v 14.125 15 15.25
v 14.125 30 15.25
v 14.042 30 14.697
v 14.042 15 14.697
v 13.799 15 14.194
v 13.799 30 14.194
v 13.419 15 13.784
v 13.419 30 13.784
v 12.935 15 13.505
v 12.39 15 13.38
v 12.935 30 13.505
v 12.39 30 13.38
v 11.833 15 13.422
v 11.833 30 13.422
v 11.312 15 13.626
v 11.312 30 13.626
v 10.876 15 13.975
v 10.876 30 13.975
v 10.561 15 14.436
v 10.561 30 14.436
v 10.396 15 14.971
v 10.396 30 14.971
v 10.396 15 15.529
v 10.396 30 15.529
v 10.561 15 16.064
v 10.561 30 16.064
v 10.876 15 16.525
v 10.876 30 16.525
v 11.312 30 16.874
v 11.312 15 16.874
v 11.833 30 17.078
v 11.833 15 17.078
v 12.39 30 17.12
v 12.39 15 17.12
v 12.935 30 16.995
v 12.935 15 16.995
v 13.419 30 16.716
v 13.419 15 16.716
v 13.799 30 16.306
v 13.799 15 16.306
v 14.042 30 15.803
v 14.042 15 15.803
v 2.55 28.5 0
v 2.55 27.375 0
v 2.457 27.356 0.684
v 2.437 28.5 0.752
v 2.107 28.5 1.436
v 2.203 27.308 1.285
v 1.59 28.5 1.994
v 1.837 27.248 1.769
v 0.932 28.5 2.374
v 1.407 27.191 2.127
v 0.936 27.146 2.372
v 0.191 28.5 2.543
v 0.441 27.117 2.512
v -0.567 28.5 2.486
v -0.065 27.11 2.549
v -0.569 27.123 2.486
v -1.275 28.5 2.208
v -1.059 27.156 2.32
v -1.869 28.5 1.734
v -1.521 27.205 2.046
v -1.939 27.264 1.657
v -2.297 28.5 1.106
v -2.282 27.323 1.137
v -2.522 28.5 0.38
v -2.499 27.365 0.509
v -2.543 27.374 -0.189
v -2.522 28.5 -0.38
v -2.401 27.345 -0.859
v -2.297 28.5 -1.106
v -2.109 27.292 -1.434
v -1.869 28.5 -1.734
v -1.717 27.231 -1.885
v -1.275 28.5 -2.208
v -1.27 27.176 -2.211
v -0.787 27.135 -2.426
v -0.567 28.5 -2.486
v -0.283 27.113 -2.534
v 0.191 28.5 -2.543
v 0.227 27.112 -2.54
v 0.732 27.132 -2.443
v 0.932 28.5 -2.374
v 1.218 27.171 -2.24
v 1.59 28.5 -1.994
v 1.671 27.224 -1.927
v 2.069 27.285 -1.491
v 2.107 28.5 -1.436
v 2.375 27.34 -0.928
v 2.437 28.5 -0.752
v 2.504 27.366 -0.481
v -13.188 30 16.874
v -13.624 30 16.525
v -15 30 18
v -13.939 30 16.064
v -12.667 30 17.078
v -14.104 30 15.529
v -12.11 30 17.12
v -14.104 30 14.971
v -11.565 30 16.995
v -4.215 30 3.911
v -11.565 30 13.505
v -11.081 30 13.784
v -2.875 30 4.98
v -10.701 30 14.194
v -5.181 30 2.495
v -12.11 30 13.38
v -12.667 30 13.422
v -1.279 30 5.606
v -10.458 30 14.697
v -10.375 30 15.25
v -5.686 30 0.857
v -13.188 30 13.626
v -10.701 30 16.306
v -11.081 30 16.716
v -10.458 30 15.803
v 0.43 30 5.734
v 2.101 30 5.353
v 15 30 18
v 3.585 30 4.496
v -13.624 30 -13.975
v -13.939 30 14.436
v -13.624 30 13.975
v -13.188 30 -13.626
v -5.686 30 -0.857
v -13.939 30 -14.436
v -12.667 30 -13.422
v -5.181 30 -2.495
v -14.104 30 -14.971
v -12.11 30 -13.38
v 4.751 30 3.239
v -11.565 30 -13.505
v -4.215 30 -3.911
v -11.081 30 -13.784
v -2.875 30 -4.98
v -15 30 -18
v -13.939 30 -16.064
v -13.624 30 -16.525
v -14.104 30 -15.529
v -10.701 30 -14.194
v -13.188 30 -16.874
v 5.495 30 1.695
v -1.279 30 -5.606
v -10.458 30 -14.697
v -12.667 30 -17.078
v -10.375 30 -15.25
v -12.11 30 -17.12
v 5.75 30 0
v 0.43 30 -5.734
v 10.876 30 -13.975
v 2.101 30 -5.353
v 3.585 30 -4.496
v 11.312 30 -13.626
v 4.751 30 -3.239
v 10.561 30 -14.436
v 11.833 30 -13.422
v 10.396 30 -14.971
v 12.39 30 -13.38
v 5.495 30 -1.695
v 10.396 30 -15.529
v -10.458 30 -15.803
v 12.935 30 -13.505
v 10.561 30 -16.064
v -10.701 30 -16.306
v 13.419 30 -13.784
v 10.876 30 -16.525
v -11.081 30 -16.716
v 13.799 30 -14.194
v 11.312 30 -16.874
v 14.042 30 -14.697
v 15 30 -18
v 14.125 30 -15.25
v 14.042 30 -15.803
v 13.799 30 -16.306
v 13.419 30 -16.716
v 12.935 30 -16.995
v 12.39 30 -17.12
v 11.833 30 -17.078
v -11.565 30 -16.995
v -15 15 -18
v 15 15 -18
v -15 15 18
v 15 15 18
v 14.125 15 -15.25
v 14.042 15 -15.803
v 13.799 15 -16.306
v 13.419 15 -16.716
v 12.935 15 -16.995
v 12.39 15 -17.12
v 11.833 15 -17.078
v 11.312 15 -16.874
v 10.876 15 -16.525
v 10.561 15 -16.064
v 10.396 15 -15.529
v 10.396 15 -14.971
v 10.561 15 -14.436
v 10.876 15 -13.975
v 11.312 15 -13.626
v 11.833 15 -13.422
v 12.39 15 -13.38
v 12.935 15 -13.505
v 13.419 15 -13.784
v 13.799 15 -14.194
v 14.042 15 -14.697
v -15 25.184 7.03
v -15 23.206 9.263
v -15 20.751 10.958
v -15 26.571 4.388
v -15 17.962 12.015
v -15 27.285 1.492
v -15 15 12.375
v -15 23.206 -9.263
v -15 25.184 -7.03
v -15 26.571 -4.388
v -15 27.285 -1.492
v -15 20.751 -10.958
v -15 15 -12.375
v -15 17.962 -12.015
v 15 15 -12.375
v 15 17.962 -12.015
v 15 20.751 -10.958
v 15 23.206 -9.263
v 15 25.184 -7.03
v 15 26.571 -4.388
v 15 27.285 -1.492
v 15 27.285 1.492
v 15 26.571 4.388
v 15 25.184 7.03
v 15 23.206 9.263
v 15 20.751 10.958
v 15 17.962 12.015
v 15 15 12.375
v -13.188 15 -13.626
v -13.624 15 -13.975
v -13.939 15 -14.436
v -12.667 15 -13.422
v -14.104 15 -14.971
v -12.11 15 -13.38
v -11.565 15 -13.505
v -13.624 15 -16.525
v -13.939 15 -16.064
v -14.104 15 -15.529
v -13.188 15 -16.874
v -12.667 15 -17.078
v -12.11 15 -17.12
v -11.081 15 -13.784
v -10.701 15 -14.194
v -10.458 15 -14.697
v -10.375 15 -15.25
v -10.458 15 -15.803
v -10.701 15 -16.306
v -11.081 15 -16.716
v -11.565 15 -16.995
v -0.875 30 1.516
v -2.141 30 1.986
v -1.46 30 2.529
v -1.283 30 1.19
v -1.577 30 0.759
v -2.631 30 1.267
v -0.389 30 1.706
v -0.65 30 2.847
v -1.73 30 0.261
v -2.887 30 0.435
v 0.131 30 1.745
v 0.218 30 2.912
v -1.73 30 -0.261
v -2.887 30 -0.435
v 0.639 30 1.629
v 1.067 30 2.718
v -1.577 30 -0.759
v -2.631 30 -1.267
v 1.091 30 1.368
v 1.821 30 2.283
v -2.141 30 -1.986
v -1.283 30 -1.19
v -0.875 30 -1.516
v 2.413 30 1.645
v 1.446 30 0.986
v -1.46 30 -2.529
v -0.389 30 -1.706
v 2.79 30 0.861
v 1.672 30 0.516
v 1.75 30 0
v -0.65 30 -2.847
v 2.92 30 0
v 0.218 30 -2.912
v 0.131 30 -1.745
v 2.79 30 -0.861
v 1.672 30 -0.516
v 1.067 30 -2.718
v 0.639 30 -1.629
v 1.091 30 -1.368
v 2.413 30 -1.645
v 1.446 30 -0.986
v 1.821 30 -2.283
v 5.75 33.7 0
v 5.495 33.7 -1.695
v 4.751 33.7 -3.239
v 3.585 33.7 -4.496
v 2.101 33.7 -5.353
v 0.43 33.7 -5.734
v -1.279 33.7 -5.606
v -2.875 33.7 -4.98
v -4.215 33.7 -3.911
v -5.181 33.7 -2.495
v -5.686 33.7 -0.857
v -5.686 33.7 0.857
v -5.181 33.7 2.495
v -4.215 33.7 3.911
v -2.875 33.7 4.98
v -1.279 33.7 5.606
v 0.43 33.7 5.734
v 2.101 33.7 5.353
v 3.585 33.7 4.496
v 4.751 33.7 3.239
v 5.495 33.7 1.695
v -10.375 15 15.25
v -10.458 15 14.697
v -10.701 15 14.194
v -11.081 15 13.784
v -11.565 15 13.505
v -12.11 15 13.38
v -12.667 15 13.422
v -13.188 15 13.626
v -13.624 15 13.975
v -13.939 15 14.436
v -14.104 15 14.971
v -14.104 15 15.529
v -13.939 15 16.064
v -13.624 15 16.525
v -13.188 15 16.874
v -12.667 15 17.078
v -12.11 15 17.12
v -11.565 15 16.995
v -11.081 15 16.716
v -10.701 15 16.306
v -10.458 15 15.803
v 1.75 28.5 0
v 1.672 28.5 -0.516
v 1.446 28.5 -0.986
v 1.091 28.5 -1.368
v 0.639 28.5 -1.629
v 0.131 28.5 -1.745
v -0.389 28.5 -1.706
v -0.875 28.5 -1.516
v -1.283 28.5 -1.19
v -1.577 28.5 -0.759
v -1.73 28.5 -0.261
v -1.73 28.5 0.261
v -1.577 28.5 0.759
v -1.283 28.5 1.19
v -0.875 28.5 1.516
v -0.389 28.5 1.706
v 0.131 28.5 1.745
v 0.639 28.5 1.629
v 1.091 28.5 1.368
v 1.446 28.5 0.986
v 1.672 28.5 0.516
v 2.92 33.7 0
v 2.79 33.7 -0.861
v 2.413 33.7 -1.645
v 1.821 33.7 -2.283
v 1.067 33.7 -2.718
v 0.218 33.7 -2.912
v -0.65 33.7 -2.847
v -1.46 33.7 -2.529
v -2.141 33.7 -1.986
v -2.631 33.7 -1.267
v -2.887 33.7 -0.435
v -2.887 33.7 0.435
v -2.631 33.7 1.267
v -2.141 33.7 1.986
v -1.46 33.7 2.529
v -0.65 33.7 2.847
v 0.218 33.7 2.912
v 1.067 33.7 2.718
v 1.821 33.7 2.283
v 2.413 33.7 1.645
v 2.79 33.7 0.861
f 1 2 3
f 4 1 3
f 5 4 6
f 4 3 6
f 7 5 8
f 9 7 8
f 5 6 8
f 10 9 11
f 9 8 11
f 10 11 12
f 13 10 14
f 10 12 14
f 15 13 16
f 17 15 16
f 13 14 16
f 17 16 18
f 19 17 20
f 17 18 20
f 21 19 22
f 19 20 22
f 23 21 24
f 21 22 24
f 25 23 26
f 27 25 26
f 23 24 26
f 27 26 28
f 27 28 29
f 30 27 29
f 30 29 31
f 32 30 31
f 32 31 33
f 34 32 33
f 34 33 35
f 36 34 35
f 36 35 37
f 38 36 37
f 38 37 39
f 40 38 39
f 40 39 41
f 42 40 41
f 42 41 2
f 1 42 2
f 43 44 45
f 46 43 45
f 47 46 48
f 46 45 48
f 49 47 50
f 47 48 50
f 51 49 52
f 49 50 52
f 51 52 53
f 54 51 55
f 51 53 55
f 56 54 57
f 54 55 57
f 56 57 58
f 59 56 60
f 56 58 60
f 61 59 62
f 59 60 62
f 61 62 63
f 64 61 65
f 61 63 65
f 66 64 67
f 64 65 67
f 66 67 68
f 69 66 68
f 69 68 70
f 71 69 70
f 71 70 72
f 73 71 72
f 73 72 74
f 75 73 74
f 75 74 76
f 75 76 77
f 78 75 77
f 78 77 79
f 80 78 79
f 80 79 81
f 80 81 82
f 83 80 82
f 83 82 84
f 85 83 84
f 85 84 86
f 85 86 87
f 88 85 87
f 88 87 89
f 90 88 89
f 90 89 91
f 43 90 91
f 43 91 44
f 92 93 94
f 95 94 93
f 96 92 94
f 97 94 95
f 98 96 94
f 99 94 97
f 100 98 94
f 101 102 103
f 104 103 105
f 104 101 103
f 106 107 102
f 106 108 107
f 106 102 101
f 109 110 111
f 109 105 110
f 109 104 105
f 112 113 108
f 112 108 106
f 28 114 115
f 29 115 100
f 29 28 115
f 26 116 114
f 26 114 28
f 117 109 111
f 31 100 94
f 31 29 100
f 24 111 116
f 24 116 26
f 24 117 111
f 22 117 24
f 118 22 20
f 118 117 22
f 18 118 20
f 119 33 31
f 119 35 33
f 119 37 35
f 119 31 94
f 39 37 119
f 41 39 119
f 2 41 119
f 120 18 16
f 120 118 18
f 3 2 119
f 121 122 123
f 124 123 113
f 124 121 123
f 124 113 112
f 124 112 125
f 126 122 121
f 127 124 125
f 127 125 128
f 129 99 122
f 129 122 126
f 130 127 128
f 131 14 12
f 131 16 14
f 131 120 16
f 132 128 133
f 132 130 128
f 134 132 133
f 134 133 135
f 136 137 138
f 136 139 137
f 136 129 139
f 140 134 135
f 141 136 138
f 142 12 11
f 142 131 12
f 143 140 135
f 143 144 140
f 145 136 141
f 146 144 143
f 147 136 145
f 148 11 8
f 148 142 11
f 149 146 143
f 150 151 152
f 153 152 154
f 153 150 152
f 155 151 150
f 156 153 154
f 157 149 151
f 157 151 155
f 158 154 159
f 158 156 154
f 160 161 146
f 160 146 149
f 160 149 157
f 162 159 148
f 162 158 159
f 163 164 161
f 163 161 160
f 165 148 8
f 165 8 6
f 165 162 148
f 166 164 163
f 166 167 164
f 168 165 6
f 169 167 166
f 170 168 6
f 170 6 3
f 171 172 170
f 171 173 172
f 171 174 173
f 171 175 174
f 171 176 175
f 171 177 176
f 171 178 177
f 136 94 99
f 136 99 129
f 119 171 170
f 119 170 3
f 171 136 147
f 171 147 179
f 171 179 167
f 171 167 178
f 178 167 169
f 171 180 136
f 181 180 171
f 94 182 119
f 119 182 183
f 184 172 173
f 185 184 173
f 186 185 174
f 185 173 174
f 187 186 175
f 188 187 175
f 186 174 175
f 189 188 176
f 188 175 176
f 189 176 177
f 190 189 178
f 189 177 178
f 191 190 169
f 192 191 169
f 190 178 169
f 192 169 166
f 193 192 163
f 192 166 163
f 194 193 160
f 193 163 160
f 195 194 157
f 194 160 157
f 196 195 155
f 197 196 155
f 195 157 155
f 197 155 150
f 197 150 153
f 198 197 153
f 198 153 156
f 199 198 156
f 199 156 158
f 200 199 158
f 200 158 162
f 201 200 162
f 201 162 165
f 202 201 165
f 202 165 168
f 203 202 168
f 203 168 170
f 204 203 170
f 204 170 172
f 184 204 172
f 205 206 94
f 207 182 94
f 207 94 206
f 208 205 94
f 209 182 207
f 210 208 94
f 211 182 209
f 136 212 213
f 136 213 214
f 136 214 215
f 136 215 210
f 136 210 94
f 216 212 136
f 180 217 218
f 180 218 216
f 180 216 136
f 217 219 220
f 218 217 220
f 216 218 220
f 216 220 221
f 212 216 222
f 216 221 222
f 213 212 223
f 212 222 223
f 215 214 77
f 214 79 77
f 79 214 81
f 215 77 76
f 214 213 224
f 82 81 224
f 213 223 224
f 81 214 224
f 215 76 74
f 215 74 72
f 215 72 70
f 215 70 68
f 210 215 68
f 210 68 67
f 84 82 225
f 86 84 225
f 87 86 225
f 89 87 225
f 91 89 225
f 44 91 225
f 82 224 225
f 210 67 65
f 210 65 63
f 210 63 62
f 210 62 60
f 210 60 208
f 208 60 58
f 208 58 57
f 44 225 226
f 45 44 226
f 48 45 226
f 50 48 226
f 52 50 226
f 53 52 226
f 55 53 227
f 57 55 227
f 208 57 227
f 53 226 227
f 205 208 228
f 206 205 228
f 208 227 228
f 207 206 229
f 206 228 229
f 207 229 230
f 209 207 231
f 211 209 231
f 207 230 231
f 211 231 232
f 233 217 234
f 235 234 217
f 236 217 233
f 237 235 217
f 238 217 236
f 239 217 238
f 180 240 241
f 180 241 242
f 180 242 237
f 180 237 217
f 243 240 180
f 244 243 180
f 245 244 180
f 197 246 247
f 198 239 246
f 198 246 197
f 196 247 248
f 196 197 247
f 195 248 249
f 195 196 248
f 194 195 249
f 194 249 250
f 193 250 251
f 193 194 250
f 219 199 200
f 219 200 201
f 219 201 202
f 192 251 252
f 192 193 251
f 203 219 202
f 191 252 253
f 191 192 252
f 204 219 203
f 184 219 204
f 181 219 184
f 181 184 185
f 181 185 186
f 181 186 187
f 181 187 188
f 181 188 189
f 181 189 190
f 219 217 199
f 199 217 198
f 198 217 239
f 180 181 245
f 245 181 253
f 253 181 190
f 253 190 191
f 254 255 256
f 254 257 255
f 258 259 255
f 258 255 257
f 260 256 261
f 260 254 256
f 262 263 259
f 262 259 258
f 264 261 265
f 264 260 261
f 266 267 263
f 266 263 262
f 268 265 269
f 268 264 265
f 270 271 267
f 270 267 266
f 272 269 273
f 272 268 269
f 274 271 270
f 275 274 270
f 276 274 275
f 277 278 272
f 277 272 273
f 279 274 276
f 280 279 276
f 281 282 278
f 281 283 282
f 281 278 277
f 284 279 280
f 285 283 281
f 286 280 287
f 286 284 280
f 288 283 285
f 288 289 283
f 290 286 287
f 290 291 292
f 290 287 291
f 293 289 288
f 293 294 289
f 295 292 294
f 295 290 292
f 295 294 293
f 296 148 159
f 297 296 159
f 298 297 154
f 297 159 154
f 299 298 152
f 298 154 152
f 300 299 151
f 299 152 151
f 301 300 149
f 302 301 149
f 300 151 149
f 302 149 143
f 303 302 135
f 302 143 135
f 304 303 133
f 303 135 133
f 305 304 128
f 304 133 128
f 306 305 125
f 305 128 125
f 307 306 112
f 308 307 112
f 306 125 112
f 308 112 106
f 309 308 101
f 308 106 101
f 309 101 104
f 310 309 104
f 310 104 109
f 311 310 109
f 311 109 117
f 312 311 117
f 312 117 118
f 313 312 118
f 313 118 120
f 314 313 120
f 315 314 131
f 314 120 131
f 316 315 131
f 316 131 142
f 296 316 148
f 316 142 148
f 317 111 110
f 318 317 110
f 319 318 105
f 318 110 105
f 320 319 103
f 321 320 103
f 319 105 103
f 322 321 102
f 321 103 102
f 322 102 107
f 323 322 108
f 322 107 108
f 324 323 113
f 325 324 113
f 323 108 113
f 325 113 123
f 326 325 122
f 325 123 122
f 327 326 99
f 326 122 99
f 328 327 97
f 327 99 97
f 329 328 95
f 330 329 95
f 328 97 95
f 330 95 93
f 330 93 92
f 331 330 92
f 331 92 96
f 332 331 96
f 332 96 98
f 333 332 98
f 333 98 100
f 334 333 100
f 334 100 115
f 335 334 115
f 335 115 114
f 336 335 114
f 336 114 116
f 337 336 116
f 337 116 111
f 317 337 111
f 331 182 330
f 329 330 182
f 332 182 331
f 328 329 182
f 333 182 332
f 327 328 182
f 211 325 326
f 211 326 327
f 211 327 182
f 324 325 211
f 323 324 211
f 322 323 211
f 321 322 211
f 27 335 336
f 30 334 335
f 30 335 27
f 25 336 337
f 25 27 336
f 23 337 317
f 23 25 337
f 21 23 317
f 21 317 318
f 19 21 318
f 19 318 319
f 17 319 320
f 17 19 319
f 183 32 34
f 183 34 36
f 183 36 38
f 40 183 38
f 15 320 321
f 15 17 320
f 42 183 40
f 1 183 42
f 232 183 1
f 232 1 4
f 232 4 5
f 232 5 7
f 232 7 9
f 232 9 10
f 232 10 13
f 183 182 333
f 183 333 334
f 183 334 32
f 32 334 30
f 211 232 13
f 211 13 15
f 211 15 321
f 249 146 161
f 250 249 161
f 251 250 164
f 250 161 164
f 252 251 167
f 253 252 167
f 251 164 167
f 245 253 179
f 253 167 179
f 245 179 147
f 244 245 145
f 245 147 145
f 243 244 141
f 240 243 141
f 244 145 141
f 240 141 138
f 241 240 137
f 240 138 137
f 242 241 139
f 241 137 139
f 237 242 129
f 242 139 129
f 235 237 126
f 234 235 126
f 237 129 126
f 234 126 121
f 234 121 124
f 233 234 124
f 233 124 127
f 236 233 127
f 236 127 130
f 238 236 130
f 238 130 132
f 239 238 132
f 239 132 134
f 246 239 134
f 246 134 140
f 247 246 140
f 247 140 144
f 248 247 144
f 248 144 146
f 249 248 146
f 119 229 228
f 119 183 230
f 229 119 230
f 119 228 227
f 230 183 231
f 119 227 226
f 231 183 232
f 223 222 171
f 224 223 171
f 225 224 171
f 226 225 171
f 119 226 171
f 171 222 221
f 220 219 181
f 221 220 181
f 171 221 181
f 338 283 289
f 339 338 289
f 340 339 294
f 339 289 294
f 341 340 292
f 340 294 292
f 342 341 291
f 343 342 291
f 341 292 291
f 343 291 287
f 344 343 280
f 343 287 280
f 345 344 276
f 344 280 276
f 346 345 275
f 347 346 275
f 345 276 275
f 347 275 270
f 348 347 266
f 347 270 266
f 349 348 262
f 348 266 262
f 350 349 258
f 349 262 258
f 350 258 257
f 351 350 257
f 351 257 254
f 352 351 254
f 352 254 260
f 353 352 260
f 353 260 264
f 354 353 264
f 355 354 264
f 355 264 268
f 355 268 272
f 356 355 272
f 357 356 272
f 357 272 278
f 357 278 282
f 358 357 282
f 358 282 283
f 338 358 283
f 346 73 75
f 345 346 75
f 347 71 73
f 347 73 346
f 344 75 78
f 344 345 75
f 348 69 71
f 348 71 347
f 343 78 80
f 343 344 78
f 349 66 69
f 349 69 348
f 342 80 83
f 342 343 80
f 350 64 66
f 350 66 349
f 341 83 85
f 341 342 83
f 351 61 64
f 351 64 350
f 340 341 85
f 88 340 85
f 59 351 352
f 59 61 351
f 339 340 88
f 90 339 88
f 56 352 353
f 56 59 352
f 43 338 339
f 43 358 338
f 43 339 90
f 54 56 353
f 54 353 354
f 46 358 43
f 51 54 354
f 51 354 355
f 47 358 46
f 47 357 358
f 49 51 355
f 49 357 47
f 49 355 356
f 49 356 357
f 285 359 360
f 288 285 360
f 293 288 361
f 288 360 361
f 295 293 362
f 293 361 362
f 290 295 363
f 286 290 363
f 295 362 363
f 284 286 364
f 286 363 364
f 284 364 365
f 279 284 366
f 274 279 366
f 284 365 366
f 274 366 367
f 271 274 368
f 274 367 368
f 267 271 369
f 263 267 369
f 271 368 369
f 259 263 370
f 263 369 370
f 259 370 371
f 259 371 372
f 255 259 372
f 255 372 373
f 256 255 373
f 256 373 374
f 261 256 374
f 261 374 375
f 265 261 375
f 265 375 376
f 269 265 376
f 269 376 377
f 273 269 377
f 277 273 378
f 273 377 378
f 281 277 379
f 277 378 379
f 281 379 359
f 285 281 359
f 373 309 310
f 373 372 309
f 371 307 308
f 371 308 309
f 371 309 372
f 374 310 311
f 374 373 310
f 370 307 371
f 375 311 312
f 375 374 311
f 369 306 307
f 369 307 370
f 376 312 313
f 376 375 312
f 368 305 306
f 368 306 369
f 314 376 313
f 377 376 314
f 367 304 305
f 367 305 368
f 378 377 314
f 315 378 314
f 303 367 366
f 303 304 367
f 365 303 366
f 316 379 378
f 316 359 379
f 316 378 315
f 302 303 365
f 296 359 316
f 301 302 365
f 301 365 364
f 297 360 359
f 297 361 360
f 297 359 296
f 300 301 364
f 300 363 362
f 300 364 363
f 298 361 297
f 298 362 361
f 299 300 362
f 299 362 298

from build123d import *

# Parameters (mm, degrees)
SKETCH1_W           = 30
SKETCH1_H           = 36
BOSS_EXTRUDE1_DEPTH = 30
SKETCH3_R           = 12.375
CUT_EXTRUDE1_DEPTH  = 40
SKETCH5_R           = 1.875
CUT_EXTRUDE2_DEPTH  = 40
CUT_EXTRUDE3_START  = 15
SKETCH7_W           = 36
SKETCH7_H           = 15
CUT_EXTRUDE3_DEPTH  = 31
SKETCH8_R           = 5.75
BOSS_EXTRUDE2_DEPTH = 3.7
SKETCH11_R          = 2.92
CUT_EXTRUDE5_DEPTH  = 3.7
SKETCH12_R          = 1.75
CUT_EXTRUDE6_DEPTH  = 3.7
SKETCH14_R          = 2.55
CUT_EXTRUDE8_DEPTH  = 13.5


with BuildPart() as part:
    # Sketch1 → Boss-Extrude1 (new body)
    with BuildSketch(Plane(origin=(0, 0, 0), x_dir=(1, 0, 0), z_dir=(0, 1, 0))):
        Rectangle(SKETCH1_W, SKETCH1_H)
    extrude(amount=BOSS_EXTRUDE1_DEPTH)

    # Sketch3 → Cut-Extrude1 (cut)
    with BuildSketch(Plane(origin=(15, 0, 0), x_dir=(0, 0, -1), z_dir=(1, 0, 0))):
        with Locations((0, 15)):
            Circle(SKETCH3_R)
    extrude(amount=-CUT_EXTRUDE1_DEPTH, mode=Mode.SUBTRACT)

    # Sketch5 → Cut-Extrude2 (cut)
    with BuildSketch(Plane(origin=(0, 30, 0), x_dir=(1, 0, 0), z_dir=(0, 1, 0))):
        with Locations((-12.25, 15.25)):
            Circle(SKETCH5_R)
        with Locations((-12.25, -15.25)):
            Circle(SKETCH5_R)
        with Locations((12.25, -15.25)):
            Circle(SKETCH5_R)
        with Locations((12.25, 15.25)):
            Circle(SKETCH5_R)
    extrude(amount=-CUT_EXTRUDE2_DEPTH, mode=Mode.SUBTRACT)

    # Sketch7 → Cut-Extrude3 (cut, through all)
    with BuildSketch(Plane(origin=(0, 0, 0), x_dir=(0, 0, -1), z_dir=(1, 0, 0)).offset(CUT_EXTRUDE3_START)):
        with Locations((0, 7.5)):
            Rectangle(SKETCH7_W, SKETCH7_H)
    extrude(amount=-CUT_EXTRUDE3_DEPTH, mode=Mode.SUBTRACT)

    # Sketch8 → Boss-Extrude2 (add)
    with BuildSketch(Plane(origin=(0, 30, 0), x_dir=(1, 0, 0), z_dir=(0, 1, 0))):
        Circle(SKETCH8_R)
    extrude(amount=BOSS_EXTRUDE2_DEPTH)

    # Sketch11 → Cut-Extrude5 (cut)
    with BuildSketch(Plane(origin=(0, 33.7, 0), x_dir=(1, 0, 0), z_dir=(0, 1, 0))):
        Circle(SKETCH11_R)
    extrude(amount=-CUT_EXTRUDE5_DEPTH, mode=Mode.SUBTRACT)

    # Sketch12 → Cut-Extrude6 (cut)
    with BuildSketch(Plane(origin=(0, 30, 0), x_dir=(1, 0, 0), z_dir=(0, 1, 0))):
        Circle(SKETCH12_R)
    extrude(amount=-CUT_EXTRUDE6_DEPTH, mode=Mode.SUBTRACT)

    # Sketch14 → Cut-Extrude8 (cut)
    with BuildSketch(Plane.XZ.offset(-15)):
        Circle(SKETCH14_R)
    extrude(amount=-CUT_EXTRUDE8_DEPTH, mode=Mode.SUBTRACT)


solid = part.part
